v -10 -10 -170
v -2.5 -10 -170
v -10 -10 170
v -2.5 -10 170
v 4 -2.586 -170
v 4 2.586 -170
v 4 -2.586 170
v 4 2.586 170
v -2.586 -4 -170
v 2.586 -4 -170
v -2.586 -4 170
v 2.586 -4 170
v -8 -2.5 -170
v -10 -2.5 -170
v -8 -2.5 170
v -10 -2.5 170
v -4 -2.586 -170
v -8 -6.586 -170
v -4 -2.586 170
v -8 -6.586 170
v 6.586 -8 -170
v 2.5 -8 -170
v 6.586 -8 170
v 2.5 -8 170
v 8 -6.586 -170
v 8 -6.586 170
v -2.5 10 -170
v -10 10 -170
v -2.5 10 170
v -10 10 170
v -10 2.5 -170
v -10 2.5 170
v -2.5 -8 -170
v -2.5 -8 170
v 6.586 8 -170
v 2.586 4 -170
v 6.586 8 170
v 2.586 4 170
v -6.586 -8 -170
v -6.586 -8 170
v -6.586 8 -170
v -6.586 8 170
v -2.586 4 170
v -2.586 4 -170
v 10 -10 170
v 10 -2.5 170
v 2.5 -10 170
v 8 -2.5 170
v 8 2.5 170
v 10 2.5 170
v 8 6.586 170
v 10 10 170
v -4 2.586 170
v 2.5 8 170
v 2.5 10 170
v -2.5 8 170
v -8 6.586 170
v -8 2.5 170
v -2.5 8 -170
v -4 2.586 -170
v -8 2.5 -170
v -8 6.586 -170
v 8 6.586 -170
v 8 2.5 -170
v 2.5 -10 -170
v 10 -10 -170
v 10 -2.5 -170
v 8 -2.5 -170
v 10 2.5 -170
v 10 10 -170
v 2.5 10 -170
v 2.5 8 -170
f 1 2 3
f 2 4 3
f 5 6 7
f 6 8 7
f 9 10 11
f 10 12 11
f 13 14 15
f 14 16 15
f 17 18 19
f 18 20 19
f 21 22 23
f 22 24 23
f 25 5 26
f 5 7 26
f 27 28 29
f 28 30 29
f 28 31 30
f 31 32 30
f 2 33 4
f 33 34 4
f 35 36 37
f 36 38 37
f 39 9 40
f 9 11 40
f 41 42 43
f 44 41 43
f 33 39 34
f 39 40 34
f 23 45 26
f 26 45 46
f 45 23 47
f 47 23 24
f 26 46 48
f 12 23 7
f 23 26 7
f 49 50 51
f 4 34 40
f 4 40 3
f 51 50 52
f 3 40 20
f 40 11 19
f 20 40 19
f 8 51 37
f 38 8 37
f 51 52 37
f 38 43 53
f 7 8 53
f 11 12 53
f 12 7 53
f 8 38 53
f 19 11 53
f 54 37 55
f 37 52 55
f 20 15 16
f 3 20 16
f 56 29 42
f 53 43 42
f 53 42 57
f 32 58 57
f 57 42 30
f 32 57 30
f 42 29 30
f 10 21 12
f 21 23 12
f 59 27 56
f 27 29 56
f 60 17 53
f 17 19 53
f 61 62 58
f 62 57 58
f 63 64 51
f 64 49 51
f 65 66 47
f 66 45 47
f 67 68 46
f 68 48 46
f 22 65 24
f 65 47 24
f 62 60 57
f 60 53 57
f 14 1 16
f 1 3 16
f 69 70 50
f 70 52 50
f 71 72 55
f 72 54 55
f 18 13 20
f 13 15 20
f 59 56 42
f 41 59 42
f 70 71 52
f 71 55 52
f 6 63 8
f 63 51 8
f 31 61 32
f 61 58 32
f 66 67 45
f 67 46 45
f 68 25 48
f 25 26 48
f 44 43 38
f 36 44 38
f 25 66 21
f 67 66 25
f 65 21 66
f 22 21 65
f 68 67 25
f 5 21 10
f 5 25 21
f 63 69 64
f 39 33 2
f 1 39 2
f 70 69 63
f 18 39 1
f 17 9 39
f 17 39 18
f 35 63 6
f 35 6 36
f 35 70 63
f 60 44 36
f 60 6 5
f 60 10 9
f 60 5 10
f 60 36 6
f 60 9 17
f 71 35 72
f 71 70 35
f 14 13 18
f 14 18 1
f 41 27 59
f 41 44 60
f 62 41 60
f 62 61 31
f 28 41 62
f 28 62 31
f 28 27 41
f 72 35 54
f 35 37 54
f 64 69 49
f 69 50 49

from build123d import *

# Parameters (mm, degrees)
BOSS_EXTRUDE1_DEPTH = 170


with BuildPart() as part:
    # Sketch1 → Boss-Extrude1 (new body, symmetric)
    with BuildSketch(Plane.XY):
        Polygon((-2.585786438, 4), (2.585786438, 4), (6.585786438, 8), (2.5, 8), (2.5, 10), (10, 10), (10, 2.5), (8, 2.5), (8, 6.585786438), (4, 2.585786438), (4, -2.585786438), (8, -6.585786438), (8, -2.5), (10, -2.5), (10, -10), (2.5, -10), (2.5, -8), (6.585786438, -8), (2.585786438, -4), (-2.585786438, -4), (-6.585786438, -8), (-2.5, -8), (-2.5, -10), (-10, -10), (-10, -2.5), (-8, -2.5), (-8, -6.585786438), (-4, -2.585786438), (-4, 2.585786438), (-8, 6.585786438), (-8, 2.5), (-10, 2.5), (-10, 10), (-2.5, 10), (-2.5, 8), (-6.585786438, 8), align=None)
    extrude(amount=BOSS_EXTRUDE1_DEPTH, both=True)


solid = part.part
